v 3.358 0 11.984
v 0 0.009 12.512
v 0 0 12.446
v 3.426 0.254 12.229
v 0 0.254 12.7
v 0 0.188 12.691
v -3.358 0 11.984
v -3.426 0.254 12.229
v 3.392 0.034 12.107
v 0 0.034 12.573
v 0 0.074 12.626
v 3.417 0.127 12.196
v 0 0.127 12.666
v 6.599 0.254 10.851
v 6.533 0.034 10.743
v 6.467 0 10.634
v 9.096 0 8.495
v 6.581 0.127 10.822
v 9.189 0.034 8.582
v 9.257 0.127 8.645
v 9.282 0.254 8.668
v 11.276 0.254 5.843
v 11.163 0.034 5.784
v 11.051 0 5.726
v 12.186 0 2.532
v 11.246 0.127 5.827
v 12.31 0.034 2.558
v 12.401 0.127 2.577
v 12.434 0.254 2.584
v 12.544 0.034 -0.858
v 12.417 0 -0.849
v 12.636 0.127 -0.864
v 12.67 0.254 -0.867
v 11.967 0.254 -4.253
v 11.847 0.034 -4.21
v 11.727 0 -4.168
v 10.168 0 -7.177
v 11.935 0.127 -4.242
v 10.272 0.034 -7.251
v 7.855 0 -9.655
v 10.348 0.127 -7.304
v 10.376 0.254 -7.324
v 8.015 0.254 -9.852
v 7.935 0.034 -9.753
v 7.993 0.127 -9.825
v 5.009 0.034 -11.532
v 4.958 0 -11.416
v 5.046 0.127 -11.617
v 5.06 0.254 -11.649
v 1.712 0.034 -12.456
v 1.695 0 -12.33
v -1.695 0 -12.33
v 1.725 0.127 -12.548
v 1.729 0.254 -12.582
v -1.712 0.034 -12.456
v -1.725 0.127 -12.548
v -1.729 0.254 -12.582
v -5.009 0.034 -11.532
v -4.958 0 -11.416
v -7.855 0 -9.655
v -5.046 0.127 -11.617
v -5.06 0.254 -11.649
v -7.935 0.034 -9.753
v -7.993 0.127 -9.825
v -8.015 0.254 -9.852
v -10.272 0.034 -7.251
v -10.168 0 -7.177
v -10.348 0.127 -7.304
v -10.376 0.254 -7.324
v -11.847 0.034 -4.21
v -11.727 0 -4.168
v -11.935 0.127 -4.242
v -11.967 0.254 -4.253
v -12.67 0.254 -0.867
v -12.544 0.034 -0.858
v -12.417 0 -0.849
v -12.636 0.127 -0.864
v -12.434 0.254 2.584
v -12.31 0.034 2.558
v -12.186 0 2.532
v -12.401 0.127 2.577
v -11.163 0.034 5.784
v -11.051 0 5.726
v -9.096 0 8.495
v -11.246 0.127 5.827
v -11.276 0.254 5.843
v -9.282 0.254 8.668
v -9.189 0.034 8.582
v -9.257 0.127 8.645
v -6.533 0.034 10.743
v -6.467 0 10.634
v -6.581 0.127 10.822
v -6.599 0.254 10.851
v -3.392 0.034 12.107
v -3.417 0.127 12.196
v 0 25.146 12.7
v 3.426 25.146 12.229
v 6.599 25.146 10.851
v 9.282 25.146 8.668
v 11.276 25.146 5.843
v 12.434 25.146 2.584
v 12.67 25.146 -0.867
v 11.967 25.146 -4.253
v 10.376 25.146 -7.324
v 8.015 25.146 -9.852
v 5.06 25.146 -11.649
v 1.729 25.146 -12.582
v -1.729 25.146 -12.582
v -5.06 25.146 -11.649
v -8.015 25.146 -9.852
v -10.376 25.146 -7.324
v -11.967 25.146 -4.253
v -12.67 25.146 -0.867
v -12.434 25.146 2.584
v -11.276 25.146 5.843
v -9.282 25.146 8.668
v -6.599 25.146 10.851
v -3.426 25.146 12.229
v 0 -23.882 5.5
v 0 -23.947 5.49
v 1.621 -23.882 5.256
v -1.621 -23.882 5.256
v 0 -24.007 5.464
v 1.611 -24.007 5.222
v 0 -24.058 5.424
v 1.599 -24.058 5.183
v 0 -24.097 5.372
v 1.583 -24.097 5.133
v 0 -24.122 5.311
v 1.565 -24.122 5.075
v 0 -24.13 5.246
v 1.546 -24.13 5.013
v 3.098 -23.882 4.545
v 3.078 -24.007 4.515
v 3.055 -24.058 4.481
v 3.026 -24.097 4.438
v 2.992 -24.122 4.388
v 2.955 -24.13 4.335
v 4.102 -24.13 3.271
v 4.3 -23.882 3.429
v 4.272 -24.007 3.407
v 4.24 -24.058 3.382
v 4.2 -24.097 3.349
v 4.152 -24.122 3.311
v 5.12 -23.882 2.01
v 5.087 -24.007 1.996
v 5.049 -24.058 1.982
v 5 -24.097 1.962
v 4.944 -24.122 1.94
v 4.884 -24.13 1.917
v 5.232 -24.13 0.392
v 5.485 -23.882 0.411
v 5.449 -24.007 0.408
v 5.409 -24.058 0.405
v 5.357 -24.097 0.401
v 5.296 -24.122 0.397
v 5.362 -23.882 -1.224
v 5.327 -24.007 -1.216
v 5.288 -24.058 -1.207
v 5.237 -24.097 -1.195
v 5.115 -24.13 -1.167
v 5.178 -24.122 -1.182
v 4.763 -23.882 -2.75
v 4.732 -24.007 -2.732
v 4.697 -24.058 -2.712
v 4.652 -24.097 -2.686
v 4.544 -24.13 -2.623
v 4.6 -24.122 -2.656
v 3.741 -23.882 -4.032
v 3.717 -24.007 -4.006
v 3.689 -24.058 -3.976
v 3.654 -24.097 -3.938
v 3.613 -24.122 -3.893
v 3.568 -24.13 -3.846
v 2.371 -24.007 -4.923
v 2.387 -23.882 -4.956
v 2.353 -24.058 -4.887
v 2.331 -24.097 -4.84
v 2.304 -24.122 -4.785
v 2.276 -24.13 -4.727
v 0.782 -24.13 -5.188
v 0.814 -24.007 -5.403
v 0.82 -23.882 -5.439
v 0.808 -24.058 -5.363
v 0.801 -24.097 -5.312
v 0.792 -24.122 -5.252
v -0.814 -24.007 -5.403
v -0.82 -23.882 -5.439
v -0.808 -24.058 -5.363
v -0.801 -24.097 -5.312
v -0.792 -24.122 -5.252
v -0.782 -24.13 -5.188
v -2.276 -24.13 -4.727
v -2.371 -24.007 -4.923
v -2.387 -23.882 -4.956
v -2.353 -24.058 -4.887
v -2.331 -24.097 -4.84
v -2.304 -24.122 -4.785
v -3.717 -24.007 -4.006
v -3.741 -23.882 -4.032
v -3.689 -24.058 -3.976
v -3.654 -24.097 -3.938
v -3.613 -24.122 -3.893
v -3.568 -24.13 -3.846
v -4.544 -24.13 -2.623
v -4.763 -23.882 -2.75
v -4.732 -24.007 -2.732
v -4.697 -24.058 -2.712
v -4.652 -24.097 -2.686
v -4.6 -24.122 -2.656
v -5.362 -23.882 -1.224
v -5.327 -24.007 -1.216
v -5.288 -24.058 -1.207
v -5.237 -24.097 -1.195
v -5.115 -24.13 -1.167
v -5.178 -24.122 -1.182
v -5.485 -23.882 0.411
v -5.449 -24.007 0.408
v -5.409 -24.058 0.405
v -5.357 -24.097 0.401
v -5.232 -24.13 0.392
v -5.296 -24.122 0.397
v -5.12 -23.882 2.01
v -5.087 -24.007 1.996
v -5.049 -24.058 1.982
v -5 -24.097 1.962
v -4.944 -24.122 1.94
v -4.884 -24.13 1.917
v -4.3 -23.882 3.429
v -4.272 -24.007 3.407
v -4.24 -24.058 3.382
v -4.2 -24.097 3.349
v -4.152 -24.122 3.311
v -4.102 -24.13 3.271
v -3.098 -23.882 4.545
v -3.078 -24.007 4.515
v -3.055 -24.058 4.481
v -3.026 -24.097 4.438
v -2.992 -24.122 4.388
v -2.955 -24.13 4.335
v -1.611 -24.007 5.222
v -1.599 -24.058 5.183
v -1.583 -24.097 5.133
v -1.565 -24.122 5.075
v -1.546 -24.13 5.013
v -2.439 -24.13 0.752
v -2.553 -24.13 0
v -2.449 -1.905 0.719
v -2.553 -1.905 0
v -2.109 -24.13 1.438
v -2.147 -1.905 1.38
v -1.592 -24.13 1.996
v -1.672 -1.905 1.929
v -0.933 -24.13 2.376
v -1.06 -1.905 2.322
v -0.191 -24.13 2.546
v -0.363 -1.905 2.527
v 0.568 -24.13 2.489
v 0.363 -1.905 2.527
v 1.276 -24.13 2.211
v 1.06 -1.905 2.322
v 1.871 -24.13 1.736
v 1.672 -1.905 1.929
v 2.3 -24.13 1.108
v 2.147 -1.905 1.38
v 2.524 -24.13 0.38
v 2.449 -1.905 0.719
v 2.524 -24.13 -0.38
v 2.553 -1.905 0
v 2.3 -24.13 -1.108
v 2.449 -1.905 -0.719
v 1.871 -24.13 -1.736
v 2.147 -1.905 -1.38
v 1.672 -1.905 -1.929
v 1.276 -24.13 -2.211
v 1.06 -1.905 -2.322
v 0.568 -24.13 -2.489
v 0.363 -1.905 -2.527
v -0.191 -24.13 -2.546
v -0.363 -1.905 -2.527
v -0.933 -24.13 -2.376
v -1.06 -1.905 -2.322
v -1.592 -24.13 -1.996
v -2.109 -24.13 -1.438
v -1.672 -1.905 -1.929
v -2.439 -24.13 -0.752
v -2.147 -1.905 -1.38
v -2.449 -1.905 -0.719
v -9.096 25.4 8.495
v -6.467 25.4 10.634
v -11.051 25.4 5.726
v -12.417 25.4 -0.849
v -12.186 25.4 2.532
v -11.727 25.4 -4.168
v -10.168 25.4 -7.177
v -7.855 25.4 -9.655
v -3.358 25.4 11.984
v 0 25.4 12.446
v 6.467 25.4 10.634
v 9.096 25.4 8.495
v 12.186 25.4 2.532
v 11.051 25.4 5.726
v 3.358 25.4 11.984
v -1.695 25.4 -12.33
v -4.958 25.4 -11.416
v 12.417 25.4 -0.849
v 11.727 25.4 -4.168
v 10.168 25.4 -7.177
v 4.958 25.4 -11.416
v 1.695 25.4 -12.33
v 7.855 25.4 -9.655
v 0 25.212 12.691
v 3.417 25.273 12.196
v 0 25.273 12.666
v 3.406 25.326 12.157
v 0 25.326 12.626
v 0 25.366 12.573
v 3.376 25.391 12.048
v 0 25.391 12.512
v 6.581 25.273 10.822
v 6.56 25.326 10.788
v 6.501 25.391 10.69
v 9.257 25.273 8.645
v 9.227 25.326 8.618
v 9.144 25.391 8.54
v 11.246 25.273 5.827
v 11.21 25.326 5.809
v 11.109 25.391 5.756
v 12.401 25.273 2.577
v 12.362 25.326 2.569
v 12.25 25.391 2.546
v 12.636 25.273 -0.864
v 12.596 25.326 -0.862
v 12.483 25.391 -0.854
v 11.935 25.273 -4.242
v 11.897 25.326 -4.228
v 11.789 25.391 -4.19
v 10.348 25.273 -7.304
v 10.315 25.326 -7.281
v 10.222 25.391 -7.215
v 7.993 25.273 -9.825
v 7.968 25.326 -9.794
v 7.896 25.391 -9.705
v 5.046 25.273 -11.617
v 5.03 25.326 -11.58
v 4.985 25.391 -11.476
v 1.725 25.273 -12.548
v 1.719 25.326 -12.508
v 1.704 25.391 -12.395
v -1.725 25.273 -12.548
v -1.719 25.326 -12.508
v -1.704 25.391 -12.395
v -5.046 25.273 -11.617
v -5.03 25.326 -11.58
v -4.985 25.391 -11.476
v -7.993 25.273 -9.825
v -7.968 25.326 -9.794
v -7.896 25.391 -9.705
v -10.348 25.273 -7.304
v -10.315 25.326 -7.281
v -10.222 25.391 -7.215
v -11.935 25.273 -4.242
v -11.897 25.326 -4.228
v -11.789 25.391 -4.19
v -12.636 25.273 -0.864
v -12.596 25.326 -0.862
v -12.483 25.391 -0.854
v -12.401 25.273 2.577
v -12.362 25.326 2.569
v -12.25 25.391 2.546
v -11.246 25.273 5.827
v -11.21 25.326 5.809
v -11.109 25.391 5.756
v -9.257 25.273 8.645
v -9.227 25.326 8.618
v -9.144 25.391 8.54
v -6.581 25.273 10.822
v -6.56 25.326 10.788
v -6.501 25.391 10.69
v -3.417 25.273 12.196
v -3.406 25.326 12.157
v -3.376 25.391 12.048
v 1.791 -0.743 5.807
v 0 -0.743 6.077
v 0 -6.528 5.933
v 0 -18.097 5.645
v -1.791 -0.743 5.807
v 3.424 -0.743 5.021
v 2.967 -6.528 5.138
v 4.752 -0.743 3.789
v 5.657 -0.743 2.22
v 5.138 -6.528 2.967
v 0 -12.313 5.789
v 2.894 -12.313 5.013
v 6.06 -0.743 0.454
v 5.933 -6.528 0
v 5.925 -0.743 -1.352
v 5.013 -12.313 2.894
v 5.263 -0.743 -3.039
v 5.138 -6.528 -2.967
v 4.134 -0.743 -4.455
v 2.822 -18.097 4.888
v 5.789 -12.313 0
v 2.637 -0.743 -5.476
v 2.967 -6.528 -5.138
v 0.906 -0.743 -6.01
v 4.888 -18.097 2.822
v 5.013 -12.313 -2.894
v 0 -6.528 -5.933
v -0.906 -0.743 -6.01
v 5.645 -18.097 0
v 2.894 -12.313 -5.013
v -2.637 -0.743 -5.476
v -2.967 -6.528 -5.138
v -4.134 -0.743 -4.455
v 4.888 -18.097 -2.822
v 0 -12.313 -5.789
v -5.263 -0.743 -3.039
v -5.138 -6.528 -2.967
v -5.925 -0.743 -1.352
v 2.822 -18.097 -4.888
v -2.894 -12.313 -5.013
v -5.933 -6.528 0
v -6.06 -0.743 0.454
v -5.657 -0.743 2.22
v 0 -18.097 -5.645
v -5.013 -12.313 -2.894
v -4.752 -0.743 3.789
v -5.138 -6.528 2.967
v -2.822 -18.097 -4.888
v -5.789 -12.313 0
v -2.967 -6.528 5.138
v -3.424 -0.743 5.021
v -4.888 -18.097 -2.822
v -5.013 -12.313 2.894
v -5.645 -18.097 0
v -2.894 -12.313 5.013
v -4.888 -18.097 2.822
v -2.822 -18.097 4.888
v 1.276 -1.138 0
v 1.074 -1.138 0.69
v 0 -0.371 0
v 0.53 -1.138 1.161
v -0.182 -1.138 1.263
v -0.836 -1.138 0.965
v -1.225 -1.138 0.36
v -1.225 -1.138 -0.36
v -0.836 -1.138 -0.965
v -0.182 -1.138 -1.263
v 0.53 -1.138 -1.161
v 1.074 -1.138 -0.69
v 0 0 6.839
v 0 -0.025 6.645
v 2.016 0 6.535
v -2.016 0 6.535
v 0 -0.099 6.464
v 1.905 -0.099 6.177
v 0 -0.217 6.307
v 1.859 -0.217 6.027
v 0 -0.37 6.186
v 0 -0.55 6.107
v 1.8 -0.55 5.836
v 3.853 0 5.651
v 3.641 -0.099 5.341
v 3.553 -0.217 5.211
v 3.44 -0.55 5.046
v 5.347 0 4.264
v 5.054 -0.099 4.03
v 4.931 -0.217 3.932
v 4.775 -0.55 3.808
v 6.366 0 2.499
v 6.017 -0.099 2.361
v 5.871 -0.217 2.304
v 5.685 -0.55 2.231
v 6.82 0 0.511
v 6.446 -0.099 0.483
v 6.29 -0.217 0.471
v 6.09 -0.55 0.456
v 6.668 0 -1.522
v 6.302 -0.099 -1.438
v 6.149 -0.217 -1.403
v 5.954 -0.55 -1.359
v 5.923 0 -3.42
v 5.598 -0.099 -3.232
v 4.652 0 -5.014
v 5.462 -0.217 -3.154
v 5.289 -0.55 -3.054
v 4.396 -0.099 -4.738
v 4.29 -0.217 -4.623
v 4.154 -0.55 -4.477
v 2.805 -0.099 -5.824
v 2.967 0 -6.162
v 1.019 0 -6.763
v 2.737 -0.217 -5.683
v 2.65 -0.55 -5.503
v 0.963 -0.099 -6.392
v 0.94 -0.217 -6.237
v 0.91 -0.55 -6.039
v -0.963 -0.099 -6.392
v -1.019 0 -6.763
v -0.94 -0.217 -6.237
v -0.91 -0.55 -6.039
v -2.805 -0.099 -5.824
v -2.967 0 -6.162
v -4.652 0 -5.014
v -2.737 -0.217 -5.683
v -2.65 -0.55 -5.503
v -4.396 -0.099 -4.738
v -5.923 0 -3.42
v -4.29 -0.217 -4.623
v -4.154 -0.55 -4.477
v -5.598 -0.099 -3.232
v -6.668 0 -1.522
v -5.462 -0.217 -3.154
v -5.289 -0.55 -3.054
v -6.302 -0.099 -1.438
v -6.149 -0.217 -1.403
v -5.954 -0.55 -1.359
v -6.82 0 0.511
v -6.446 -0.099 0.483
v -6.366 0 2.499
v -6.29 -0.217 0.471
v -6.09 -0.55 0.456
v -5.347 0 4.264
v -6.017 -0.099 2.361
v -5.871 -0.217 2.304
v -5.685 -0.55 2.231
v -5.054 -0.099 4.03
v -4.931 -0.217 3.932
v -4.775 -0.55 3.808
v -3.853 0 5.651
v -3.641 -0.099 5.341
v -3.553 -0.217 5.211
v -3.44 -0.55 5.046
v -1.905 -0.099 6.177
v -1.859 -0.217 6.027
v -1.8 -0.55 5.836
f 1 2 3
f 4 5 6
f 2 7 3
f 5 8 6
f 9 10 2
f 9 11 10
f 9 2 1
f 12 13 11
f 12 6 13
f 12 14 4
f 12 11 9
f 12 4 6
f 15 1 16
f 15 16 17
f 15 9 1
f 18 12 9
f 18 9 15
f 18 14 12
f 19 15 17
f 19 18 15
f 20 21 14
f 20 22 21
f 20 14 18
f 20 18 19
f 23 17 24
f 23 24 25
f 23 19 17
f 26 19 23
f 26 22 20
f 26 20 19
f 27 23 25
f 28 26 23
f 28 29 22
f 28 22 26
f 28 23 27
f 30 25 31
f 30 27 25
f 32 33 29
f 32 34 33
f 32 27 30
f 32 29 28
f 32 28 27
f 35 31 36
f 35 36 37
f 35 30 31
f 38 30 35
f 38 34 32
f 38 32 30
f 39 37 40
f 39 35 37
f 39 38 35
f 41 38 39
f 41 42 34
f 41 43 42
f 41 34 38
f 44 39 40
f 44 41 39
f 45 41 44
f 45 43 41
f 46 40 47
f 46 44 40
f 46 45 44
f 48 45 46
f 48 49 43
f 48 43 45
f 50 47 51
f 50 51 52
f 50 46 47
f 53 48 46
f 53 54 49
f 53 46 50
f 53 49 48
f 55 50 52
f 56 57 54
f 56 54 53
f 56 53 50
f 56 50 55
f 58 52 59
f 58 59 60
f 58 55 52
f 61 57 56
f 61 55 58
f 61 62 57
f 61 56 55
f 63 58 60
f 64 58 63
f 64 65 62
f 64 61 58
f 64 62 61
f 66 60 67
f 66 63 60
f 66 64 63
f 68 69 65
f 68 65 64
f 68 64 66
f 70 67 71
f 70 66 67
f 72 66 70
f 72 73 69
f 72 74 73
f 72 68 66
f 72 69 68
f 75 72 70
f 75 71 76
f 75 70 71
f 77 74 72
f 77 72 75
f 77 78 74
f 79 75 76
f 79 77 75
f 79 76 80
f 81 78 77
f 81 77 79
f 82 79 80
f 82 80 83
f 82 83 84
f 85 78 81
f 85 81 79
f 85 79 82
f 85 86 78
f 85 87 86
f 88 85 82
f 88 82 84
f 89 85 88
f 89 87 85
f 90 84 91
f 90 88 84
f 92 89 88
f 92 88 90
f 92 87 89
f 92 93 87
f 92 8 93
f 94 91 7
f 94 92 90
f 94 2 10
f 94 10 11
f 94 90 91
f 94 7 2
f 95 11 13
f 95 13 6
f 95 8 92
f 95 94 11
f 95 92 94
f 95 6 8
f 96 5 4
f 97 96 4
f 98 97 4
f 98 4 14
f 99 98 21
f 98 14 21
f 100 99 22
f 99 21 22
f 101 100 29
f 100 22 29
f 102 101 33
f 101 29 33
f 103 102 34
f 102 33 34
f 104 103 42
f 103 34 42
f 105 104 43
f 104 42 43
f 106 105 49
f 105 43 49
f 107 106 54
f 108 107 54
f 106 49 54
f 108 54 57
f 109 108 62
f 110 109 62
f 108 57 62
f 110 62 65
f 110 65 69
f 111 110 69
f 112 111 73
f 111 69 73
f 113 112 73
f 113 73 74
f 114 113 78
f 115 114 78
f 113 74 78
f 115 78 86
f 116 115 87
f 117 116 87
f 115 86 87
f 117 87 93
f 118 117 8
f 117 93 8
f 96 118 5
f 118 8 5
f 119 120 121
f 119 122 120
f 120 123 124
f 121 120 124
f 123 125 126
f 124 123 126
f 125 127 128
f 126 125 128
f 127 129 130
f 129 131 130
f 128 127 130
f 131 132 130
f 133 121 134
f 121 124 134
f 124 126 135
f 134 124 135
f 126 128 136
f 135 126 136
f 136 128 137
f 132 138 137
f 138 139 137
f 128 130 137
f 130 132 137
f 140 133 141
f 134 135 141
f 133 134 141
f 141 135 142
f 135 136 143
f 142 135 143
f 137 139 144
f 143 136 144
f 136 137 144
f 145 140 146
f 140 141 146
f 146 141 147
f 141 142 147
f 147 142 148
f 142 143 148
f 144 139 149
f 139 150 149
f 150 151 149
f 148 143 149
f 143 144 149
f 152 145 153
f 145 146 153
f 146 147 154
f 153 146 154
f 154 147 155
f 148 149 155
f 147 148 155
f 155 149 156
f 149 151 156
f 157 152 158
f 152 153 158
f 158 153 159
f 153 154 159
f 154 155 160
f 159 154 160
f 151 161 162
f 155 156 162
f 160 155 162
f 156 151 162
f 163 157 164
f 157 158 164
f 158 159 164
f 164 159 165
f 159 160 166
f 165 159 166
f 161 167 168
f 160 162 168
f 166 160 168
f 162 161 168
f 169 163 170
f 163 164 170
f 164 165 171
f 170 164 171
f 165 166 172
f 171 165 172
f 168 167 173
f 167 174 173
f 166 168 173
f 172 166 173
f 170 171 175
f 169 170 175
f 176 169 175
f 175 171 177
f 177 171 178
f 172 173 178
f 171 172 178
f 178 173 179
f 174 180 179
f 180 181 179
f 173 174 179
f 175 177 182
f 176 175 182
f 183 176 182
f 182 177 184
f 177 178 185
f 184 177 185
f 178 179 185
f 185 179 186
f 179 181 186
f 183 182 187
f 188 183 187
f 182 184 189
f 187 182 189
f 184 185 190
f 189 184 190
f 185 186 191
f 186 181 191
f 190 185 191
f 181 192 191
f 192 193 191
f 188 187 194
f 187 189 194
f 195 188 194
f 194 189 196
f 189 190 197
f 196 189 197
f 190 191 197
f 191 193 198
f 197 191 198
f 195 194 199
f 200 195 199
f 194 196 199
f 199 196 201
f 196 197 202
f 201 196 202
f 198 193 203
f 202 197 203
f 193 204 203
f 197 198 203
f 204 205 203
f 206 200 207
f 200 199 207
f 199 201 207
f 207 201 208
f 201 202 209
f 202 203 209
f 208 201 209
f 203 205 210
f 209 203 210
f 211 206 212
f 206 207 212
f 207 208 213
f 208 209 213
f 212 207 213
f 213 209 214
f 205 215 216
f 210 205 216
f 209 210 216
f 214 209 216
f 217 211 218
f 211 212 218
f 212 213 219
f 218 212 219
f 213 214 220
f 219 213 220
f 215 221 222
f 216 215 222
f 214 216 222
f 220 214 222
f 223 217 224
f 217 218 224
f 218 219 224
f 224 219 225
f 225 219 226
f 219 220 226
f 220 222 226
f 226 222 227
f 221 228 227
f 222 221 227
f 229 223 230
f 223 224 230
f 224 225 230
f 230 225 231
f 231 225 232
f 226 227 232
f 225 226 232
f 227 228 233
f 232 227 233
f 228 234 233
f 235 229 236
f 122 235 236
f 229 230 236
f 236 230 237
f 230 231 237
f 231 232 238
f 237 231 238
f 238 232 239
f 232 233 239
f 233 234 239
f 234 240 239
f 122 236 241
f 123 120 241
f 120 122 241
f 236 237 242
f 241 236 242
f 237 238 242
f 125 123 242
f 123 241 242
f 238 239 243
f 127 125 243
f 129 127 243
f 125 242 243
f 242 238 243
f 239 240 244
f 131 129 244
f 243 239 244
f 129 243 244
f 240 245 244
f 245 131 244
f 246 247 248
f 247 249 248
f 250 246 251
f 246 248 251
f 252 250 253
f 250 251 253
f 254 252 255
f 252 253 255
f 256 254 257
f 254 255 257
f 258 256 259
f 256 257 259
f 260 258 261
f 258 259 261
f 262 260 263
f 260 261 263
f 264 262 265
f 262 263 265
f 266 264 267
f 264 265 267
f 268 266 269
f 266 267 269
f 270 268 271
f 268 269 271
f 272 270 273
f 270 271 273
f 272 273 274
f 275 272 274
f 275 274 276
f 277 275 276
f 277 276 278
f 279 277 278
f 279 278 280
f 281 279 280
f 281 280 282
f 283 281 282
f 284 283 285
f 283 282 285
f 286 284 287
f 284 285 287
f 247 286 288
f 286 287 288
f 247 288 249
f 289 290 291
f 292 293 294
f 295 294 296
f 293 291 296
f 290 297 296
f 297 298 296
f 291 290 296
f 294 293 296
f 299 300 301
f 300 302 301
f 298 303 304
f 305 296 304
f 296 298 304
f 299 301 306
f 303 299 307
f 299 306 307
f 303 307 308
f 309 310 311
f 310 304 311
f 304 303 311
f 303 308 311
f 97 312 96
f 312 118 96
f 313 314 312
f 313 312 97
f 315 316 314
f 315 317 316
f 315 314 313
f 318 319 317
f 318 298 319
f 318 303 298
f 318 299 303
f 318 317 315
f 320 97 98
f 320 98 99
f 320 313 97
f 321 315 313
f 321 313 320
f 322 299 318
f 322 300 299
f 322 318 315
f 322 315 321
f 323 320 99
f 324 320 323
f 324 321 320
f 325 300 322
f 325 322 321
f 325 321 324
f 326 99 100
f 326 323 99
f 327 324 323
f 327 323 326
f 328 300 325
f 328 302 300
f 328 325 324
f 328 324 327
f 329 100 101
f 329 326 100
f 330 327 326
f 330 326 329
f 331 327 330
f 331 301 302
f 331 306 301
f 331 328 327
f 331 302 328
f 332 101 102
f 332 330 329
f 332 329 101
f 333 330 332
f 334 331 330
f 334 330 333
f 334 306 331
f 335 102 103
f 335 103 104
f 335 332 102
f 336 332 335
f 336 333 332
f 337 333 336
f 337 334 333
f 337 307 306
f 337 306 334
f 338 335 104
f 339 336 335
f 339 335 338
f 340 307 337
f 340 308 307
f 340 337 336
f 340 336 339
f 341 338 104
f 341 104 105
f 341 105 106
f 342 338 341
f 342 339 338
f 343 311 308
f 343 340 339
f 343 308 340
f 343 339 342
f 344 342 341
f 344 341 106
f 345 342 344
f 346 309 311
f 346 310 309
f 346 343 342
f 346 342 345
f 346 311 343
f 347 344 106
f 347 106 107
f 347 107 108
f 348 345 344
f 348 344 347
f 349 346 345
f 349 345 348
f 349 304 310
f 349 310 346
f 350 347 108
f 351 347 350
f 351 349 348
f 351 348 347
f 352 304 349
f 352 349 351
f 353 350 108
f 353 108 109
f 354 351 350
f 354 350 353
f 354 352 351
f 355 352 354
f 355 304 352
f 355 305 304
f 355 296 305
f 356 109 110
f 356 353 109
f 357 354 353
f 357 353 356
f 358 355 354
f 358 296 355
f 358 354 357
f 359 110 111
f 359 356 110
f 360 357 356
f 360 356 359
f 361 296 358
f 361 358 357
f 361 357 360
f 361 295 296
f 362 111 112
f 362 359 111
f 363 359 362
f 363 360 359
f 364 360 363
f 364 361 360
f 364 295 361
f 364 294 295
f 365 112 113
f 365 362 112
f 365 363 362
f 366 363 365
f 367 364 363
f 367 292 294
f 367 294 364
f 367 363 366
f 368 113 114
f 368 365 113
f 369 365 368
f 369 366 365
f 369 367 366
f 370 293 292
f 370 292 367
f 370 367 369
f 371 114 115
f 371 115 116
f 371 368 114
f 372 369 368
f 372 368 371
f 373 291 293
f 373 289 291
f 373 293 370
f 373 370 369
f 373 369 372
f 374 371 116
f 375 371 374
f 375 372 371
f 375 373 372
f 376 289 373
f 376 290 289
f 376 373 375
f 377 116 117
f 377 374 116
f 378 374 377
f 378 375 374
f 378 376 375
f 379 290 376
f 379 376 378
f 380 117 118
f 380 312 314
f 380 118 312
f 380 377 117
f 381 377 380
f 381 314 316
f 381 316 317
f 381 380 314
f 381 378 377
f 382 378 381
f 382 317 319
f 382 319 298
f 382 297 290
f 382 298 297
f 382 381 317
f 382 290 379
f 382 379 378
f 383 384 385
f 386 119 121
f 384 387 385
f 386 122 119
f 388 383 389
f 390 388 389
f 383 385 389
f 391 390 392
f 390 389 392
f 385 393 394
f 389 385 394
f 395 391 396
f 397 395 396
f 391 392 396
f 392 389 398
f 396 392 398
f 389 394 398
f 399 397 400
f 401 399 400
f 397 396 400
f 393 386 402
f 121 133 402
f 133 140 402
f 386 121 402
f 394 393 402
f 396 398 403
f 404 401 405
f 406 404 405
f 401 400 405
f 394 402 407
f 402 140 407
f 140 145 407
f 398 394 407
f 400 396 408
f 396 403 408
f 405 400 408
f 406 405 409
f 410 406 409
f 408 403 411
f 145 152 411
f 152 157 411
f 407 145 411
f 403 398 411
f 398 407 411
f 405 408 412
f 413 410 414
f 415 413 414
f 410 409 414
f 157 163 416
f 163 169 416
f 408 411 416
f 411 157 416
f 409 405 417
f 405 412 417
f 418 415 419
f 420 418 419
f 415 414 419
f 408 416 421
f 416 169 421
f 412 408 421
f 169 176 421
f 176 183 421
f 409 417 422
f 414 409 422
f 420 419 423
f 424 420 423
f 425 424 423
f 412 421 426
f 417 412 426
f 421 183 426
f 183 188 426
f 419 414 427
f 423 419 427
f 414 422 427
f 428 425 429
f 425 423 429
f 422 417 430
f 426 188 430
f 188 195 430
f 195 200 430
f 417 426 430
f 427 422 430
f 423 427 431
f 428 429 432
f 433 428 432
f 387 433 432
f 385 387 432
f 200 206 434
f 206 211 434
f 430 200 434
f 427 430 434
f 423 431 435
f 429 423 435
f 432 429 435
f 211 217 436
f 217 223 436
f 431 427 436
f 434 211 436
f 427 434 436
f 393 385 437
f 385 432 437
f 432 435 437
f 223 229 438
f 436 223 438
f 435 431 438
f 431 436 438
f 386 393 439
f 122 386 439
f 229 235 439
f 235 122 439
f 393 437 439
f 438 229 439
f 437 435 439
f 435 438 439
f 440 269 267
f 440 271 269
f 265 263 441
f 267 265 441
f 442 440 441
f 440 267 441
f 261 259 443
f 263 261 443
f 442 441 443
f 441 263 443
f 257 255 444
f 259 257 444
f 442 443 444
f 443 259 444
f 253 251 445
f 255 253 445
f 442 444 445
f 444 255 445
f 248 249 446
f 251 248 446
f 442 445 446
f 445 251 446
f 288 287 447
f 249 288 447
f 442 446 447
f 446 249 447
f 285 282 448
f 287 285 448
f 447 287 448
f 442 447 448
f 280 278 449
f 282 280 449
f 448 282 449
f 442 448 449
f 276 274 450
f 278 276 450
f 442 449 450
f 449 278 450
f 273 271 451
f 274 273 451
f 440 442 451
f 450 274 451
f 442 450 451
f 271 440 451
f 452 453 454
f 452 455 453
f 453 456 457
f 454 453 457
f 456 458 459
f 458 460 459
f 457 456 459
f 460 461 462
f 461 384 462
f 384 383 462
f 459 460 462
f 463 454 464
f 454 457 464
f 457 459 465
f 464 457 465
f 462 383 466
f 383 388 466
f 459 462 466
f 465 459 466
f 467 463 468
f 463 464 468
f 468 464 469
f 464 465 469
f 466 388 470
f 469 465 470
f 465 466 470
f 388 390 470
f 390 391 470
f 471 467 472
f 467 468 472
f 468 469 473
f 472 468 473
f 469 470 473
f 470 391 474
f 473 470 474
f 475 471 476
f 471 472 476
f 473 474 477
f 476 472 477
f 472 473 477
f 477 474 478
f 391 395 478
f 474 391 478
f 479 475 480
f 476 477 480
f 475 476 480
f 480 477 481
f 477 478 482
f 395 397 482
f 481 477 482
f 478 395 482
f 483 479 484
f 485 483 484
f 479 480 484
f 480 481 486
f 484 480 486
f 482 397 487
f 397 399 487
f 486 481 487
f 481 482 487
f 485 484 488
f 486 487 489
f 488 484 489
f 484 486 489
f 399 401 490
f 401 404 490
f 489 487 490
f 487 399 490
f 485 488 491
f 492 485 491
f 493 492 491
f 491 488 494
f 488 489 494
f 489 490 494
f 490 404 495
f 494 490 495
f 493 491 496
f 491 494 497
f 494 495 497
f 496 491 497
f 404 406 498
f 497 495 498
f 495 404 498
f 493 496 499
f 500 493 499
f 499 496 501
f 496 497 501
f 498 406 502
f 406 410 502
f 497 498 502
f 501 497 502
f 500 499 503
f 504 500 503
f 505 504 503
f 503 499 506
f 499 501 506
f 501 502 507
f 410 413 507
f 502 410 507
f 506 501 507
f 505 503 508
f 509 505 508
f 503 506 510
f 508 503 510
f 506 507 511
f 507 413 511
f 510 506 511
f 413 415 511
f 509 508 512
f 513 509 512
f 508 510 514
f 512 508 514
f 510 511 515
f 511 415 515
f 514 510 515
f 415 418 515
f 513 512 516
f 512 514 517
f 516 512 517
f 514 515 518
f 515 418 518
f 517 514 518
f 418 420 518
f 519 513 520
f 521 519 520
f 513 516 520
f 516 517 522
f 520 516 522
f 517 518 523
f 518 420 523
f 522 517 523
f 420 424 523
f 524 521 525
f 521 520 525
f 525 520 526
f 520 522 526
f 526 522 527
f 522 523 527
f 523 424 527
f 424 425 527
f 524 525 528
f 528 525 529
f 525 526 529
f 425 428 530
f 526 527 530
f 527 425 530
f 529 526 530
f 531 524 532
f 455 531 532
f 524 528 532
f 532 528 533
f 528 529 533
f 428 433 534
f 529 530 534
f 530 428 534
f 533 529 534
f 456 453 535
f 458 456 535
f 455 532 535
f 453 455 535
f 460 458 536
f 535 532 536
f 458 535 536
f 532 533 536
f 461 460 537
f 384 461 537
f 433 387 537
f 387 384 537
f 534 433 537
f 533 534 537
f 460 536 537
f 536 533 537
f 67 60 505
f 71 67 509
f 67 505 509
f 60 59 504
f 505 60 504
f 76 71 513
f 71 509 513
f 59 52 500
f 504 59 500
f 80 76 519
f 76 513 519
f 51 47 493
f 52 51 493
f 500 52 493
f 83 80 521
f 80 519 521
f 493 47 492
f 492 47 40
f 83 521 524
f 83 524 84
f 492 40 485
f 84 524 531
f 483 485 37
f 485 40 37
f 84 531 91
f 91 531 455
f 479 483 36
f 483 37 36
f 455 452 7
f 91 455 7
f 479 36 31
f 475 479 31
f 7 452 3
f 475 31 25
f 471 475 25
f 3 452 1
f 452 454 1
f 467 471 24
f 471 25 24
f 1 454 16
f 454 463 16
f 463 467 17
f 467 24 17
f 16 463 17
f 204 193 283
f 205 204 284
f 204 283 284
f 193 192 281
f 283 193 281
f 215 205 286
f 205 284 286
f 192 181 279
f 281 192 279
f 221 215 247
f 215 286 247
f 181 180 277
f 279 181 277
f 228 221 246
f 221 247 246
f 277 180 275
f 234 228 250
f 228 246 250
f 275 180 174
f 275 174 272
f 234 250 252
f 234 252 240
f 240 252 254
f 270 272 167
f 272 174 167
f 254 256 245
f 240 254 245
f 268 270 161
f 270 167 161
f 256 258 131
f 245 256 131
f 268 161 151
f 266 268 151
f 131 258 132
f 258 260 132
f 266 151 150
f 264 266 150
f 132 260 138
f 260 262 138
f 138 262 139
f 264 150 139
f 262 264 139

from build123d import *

# Parameters (mm, degrees)
F3_D     = 5.1054
F3_DEPTH = 22.225
F3_TIP   = 1.5338169022
F4_R     = 0.762
F5_R     = 0.254


with BuildPart() as f1:
    # F0 (on Right) → F1 (revolve)
    with BuildSketch(Plane.YZ):
        Polygon((-24.13, 0), (25.4, 0), (25.4, 12.7), (0, 12.7), (0, 6.096), (-24.13, 5.4941811878), align=None)
    revolve(axis=Axis((0, 0.635, 0), (0, 1, 0)))

    # F3
    with Locations(Plane.XZ.offset(24.13)):
        with Locations((0, 0)):
            Hole(F3_D / 2, depth=F3_DEPTH)
            with Locations((0, 0, -(F3_DEPTH + F3_TIP / 2))):  # 118° drill point
                Cone(0, F3_D / 2, F3_TIP, mode=Mode.SUBTRACT)

    # F4
    f4_edges = [f1.edges().sort_by_distance(p)[0] for p in [
        (0, 0, -6.096),
    ]]
    fillet(f4_edges, radius=F4_R)

    # F5
    f5_edges = [f1.edges().sort_by_distance(p)[0] for p in [
        (0, 0, -12.7),
        (0, 25.4, -12.7),
        (0, -24.13, -5.494181),
    ]]
    fillet(f5_edges, radius=F5_R)


solid = f1.part
